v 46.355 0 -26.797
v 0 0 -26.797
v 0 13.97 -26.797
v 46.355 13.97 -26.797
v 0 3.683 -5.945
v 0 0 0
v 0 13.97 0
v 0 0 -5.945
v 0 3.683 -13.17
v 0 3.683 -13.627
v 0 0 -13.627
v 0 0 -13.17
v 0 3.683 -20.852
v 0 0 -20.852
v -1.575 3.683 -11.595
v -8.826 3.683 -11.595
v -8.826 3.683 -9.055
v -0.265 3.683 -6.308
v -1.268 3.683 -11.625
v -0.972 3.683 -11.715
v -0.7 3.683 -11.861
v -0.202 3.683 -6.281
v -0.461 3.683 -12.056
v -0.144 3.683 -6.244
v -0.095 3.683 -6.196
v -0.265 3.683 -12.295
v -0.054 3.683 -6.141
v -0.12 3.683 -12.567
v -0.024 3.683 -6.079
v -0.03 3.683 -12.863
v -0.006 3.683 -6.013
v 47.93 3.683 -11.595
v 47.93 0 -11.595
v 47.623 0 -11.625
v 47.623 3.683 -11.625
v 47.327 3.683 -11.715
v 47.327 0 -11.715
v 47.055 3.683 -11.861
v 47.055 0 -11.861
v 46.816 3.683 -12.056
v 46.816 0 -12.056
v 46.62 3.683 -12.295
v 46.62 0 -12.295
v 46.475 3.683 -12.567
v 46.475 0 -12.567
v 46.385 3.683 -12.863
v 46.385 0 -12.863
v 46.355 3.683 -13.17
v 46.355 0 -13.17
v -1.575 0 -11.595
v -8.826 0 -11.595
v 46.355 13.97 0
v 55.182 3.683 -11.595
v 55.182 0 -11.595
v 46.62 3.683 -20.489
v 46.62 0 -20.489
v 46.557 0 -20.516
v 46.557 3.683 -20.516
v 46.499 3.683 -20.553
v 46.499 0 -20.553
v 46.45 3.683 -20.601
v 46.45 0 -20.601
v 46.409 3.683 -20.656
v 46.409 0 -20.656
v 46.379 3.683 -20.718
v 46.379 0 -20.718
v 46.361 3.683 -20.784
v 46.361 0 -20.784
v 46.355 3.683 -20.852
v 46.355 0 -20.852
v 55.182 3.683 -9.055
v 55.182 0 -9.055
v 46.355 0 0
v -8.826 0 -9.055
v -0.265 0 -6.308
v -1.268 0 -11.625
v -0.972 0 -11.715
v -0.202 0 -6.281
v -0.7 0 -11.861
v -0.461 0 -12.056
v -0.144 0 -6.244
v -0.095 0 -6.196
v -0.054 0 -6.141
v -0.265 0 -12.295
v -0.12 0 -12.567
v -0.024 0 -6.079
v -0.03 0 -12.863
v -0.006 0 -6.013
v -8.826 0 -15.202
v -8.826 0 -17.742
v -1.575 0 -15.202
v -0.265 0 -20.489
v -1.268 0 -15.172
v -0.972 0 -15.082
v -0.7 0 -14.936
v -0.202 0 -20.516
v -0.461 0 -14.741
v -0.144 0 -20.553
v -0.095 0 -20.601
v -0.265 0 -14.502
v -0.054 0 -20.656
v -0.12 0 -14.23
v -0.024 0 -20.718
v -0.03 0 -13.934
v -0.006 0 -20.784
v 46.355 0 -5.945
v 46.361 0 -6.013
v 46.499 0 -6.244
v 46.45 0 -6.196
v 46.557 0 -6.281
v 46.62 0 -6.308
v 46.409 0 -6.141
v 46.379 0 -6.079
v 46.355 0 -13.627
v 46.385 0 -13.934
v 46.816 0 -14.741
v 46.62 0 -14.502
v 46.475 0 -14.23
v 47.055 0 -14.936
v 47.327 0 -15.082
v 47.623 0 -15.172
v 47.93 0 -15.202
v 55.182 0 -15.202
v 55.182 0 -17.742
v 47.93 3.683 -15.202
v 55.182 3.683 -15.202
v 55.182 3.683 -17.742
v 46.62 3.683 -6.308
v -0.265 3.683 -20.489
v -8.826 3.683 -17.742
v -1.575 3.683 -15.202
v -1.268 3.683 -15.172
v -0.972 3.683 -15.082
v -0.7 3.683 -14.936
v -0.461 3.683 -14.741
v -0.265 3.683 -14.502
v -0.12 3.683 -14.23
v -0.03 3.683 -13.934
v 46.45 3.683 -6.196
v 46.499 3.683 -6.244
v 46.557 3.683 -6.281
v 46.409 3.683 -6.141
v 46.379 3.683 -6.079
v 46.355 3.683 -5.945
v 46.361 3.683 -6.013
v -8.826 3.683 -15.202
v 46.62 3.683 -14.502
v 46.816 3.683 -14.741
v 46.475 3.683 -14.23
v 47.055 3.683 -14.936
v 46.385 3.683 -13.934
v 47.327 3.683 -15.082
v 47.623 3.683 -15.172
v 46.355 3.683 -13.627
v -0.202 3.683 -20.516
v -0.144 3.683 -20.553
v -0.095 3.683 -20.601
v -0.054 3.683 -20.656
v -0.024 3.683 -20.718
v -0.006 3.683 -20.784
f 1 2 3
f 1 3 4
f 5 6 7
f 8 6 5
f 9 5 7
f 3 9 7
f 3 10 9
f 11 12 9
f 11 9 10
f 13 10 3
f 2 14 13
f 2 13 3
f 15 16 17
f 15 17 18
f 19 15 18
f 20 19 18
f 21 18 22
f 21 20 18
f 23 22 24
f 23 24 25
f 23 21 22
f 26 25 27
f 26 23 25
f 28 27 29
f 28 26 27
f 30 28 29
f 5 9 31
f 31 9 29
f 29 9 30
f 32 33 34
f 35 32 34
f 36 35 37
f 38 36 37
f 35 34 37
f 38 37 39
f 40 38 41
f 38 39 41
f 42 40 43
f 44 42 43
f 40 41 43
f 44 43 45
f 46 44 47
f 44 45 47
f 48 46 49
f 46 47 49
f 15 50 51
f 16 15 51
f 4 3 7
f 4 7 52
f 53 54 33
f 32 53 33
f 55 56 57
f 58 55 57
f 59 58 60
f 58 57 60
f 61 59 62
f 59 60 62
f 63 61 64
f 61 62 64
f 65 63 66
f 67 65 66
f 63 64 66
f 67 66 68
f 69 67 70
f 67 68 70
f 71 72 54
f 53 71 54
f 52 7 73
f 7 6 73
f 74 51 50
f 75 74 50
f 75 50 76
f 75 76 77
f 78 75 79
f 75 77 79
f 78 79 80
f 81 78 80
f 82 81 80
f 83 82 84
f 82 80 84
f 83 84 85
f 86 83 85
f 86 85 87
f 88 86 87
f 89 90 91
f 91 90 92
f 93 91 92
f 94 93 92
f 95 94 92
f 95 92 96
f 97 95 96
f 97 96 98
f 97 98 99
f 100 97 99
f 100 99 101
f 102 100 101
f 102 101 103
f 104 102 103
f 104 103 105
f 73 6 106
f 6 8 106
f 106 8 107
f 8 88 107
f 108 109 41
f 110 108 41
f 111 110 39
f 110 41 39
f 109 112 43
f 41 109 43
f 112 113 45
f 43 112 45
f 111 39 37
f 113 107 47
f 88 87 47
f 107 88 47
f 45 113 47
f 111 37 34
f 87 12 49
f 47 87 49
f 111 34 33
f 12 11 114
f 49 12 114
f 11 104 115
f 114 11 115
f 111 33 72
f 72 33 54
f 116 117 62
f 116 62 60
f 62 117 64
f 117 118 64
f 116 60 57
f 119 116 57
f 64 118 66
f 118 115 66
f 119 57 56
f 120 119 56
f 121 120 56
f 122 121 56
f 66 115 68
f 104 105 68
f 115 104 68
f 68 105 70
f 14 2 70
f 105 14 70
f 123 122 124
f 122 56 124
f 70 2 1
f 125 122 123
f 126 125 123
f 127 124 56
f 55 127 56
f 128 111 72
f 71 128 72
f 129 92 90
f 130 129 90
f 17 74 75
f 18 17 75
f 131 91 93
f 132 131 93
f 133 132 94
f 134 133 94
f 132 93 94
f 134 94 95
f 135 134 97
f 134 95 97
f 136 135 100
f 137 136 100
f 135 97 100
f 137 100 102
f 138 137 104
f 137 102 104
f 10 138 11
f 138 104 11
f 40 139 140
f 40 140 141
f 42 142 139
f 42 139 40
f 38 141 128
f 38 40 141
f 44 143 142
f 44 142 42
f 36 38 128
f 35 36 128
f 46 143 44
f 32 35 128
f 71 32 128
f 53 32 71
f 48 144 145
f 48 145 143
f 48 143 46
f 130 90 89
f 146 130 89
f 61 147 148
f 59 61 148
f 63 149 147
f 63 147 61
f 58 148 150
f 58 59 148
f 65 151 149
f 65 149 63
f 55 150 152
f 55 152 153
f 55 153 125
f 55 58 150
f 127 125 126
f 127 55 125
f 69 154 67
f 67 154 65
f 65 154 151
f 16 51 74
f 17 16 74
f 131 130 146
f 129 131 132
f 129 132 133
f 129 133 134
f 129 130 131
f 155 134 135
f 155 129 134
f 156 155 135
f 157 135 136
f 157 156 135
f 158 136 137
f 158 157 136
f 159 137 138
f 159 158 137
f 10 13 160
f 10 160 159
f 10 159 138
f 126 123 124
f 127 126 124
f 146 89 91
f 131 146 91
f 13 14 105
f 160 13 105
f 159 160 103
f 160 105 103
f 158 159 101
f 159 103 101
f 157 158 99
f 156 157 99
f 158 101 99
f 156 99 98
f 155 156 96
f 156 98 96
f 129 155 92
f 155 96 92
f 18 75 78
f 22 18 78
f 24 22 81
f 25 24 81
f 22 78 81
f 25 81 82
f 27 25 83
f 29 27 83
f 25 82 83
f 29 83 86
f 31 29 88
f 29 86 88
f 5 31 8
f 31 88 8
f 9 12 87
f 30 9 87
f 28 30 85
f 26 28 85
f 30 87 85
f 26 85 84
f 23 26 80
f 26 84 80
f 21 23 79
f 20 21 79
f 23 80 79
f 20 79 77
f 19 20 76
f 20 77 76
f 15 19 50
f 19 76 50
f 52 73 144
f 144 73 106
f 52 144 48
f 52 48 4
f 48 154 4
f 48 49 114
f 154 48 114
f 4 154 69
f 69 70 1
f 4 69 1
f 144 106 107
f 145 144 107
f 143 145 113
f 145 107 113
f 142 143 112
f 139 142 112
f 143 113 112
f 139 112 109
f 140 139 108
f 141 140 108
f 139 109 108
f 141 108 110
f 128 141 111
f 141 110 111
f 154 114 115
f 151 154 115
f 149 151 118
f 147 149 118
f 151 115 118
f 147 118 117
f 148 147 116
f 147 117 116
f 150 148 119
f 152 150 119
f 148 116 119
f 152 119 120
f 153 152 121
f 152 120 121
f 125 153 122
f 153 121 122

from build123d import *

# Parameters (mm, degrees)
BOSS_EXTRUDE1_DEPTH = 3.683
SKETCH2_W           = 46.355
SKETCH2_H           = 26.797
BOSS_EXTRUDE2_DEPTH = 10.287


with BuildPart() as part:
    # Sketch1 → Boss-Extrude1 (new body)
    with BuildSketch(Plane(origin=(0, 0, 0), x_dir=(1, 0, 0), z_dir=(0, 1, 0))):
        with BuildLine():
            Line((0, 0), (46.355, 0))
            Line((46.355, 0), (46.355, 5.945116694))
            ThreePointArc((46.355, 5.945116694), (46.428176367, 6.169628633), (46.619596382, 6.307899271))
            Line((46.619596382, 6.307899271), (55.1815, 9.0551))
            Line((55.1815, 9.0551), (55.1815, 11.5951))
            Line((55.1815, 11.5951), (47.9298, 11.5951))
            ThreePointArc((47.9298, 11.5951), (46.816248241, 12.056348241), (46.355, 13.1699))
            Line((46.355, 13.1699), (46.355, 13.6271))
            ThreePointArc((46.355, 13.6271), (46.816248241, 14.740651759), (47.9298, 15.2019))
            Line((47.9298, 15.2019), (55.1815, 15.2019))
            Line((55.1815, 15.2019), (55.1815, 17.7419))
            Line((55.1815, 17.7419), (46.619596382, 20.489100729))
            ThreePointArc((46.619596382, 20.489100729), (46.428176367, 20.627371367), (46.355, 20.851883306))
            Line((46.355, 20.851883306), (46.355, 26.797))
            Line((46.355, 26.797), (0, 26.797))
            Line((0, 26.797), (0, 20.851883306))
            ThreePointArc((0, 20.851883306), (-0.073176367, 20.627371367), (-0.264596382, 20.489100729))
            Line((-0.264596382, 20.489100729), (-8.8265, 17.7419))
            Line((-8.8265, 17.7419), (-8.8265, 15.2019))
            Line((-8.8265, 15.2019), (-1.5748, 15.2019))
            ThreePointArc((-1.5748, 15.2019), (-0.461248241, 14.740651759), (0, 13.6271))
            Line((0, 13.6271), (0, 13.1699))
            ThreePointArc((0, 13.1699), (-0.461248241, 12.056348241), (-1.5748, 11.5951))
            Line((-1.5748, 11.5951), (-8.8265, 11.5951))
            Line((-8.8265, 11.5951), (-8.8265, 9.0551))
            Line((-8.8265, 9.0551), (-0.264596382, 6.307899271))
            ThreePointArc((-0.264596382, 6.307899271), (-0.073176367, 6.169628633), (0, 5.945116694))
            Line((0, 5.945116694), (0, 0))
        make_face()
    extrude(amount=BOSS_EXTRUDE1_DEPTH)

    # Sketch2 → Boss-Extrude2 (add)
    with BuildSketch(Plane(origin=(0, 3.683, 0), x_dir=(1, 0, 0), z_dir=(0, 1, 0))):
        with Locations((23.1775, 13.3985)):
            Rectangle(SKETCH2_W, SKETCH2_H)
    extrude(amount=BOSS_EXTRUDE2_DEPTH)


solid = part.part
